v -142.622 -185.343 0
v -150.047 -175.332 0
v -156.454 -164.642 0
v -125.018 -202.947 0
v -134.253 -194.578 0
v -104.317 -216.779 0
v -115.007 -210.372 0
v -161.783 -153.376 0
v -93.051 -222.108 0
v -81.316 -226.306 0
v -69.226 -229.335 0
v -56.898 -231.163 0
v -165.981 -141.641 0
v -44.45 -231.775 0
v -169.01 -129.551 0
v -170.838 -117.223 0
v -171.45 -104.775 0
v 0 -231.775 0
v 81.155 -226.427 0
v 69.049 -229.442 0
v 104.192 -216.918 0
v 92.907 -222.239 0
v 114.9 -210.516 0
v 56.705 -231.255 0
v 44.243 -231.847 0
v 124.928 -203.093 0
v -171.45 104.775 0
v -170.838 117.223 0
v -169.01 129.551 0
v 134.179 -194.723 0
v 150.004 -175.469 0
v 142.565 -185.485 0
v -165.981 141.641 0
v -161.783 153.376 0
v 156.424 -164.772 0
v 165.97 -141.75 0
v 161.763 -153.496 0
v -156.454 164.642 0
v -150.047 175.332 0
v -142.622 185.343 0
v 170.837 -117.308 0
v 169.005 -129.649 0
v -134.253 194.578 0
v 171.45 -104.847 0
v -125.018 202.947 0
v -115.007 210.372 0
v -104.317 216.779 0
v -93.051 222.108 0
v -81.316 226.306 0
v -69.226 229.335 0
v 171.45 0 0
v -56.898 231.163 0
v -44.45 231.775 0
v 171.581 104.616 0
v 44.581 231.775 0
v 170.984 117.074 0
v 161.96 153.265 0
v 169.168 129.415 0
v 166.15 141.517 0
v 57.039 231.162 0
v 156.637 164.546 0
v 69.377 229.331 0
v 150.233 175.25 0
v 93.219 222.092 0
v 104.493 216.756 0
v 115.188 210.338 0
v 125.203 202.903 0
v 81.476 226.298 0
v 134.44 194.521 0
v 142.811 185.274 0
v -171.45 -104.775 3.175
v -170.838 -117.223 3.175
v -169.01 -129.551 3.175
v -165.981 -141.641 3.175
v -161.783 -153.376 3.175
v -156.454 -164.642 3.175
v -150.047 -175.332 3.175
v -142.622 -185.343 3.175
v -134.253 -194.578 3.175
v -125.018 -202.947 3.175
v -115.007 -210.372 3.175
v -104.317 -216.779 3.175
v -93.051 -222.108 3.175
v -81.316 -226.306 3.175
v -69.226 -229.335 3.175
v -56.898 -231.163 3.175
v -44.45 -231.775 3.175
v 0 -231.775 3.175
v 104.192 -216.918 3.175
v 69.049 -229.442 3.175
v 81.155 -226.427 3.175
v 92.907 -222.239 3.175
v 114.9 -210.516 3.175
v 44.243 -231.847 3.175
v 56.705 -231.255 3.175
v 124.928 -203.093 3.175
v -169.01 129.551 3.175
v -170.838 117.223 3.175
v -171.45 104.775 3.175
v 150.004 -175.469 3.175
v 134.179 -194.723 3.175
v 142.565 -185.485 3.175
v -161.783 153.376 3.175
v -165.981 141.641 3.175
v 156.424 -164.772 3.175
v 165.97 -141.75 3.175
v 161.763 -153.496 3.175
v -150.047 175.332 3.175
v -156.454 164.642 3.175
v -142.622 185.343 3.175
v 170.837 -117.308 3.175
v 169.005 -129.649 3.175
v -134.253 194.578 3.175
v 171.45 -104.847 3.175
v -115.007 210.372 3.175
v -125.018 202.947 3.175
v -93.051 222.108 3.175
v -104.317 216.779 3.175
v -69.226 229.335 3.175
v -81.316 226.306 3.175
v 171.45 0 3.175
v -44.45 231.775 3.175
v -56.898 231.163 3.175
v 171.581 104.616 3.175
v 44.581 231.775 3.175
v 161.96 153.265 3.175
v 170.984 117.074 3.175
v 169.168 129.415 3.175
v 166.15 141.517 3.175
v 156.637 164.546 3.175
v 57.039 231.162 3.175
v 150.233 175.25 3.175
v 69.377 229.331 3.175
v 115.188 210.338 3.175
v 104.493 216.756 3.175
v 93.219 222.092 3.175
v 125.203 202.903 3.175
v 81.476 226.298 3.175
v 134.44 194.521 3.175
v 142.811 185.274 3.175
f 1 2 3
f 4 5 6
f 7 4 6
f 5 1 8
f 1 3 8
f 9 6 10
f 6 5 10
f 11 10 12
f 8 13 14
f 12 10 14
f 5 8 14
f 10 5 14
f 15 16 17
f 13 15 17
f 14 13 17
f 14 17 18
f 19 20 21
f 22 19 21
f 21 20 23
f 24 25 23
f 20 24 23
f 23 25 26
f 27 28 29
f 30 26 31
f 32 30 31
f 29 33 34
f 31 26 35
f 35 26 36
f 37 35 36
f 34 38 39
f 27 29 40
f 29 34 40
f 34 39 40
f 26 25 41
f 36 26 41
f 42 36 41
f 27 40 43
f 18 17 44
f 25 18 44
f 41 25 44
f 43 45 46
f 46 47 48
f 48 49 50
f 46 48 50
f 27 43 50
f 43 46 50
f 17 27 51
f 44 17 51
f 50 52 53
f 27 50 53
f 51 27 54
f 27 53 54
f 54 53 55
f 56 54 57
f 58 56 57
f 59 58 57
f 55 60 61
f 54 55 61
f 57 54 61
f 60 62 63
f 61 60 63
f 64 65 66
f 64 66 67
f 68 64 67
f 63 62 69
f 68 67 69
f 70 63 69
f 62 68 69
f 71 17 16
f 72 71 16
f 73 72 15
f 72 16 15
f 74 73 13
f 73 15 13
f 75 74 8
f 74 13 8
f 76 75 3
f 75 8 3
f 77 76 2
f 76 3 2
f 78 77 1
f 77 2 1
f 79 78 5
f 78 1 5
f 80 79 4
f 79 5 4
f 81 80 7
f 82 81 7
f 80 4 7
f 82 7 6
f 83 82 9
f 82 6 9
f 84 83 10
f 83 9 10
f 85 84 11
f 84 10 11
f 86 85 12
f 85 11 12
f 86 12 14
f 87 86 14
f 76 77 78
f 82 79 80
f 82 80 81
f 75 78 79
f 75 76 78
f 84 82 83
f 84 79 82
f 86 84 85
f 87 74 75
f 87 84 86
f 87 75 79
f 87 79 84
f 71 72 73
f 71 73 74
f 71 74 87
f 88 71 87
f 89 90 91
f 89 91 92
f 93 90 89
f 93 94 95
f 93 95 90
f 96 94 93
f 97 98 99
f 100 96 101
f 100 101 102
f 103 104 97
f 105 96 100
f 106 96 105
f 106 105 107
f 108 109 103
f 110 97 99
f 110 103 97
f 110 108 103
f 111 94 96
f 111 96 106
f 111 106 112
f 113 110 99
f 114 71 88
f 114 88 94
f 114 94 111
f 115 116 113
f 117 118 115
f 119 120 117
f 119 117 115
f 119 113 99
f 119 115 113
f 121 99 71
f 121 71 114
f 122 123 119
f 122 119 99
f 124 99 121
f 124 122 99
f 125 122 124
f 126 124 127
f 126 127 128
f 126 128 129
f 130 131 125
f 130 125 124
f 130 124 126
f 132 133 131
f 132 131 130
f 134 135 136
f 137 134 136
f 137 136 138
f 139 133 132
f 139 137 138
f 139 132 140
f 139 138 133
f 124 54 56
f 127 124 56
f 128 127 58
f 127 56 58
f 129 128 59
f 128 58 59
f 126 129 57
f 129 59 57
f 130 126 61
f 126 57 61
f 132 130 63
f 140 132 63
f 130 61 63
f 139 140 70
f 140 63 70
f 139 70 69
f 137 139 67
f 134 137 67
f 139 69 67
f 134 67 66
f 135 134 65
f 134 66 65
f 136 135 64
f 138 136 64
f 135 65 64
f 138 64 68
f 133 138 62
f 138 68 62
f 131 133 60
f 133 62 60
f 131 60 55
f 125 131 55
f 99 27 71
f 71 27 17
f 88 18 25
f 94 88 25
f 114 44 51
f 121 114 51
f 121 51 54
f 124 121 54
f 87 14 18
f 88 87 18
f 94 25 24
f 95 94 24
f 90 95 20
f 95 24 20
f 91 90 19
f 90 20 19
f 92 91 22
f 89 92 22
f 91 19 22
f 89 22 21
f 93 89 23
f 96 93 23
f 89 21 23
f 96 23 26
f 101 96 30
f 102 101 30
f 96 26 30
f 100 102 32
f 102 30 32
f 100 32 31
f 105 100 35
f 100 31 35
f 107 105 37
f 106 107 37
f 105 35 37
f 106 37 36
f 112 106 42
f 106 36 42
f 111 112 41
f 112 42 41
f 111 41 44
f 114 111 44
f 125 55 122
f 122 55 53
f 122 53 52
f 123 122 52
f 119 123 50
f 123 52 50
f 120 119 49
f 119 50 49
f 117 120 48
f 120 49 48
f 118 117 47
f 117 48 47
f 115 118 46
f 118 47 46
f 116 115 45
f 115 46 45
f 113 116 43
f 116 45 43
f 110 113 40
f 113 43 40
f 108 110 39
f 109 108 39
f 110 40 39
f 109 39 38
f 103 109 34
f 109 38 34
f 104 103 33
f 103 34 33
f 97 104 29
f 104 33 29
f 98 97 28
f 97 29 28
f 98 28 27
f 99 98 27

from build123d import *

# Parameters (mm, degrees)
F1_DEPTH = 3.175


with BuildPart() as f1:
    # F0 (on Top) → F1 (new body)
    with BuildSketch(Plane.XY):
        with BuildLine():
            Line((0, 0), (0, 231.775))
            Line((0, 231.775), (-44.45, 231.775))
            ThreePointArc((-44.45, 231.775), (-134.252561, 194.577561), (-171.45, 104.775))
            Line((-171.45, 104.775), (-171.45, 0))
            Line((-171.45, 0), (0, 0))
        make_face()
        with BuildLine():
            Line((44.581378, 231.775), (0, 231.775))
            Line((0, 231.775), (0, 0))
            Line((0, 0), (171.45, 0))
            Line((171.45, 0), (171.581278, 104.615633))
            ThreePointArc((171.581278, 104.615633), (134.440266, 194.521199), (44.581378, 231.775))
        make_face()
        with BuildLine():
            Line((171.45, 0), (0, 0))
            Line((0, 0), (0, -231.775))
            Line((0, -231.775), (44.243227, -231.847034))
            ThreePointArc((44.243227, -231.847034), (134.179426, -194.722839), (171.45, -104.847202))
            Line((171.45, -104.847202), (171.45, 0))
        make_face()
        with BuildLine():
            Line((0, -231.775), (0, 0))
            Line((0, 0), (-171.45, 0))
            Line((-171.45, 0), (-171.45, -104.775))
            ThreePointArc((-171.45, -104.775), (-134.252561, -194.577561), (-44.45, -231.775))
            Line((-44.45, -231.775), (0, -231.775))
        make_face()
    extrude(amount=F1_DEPTH)


solid = f1.part
